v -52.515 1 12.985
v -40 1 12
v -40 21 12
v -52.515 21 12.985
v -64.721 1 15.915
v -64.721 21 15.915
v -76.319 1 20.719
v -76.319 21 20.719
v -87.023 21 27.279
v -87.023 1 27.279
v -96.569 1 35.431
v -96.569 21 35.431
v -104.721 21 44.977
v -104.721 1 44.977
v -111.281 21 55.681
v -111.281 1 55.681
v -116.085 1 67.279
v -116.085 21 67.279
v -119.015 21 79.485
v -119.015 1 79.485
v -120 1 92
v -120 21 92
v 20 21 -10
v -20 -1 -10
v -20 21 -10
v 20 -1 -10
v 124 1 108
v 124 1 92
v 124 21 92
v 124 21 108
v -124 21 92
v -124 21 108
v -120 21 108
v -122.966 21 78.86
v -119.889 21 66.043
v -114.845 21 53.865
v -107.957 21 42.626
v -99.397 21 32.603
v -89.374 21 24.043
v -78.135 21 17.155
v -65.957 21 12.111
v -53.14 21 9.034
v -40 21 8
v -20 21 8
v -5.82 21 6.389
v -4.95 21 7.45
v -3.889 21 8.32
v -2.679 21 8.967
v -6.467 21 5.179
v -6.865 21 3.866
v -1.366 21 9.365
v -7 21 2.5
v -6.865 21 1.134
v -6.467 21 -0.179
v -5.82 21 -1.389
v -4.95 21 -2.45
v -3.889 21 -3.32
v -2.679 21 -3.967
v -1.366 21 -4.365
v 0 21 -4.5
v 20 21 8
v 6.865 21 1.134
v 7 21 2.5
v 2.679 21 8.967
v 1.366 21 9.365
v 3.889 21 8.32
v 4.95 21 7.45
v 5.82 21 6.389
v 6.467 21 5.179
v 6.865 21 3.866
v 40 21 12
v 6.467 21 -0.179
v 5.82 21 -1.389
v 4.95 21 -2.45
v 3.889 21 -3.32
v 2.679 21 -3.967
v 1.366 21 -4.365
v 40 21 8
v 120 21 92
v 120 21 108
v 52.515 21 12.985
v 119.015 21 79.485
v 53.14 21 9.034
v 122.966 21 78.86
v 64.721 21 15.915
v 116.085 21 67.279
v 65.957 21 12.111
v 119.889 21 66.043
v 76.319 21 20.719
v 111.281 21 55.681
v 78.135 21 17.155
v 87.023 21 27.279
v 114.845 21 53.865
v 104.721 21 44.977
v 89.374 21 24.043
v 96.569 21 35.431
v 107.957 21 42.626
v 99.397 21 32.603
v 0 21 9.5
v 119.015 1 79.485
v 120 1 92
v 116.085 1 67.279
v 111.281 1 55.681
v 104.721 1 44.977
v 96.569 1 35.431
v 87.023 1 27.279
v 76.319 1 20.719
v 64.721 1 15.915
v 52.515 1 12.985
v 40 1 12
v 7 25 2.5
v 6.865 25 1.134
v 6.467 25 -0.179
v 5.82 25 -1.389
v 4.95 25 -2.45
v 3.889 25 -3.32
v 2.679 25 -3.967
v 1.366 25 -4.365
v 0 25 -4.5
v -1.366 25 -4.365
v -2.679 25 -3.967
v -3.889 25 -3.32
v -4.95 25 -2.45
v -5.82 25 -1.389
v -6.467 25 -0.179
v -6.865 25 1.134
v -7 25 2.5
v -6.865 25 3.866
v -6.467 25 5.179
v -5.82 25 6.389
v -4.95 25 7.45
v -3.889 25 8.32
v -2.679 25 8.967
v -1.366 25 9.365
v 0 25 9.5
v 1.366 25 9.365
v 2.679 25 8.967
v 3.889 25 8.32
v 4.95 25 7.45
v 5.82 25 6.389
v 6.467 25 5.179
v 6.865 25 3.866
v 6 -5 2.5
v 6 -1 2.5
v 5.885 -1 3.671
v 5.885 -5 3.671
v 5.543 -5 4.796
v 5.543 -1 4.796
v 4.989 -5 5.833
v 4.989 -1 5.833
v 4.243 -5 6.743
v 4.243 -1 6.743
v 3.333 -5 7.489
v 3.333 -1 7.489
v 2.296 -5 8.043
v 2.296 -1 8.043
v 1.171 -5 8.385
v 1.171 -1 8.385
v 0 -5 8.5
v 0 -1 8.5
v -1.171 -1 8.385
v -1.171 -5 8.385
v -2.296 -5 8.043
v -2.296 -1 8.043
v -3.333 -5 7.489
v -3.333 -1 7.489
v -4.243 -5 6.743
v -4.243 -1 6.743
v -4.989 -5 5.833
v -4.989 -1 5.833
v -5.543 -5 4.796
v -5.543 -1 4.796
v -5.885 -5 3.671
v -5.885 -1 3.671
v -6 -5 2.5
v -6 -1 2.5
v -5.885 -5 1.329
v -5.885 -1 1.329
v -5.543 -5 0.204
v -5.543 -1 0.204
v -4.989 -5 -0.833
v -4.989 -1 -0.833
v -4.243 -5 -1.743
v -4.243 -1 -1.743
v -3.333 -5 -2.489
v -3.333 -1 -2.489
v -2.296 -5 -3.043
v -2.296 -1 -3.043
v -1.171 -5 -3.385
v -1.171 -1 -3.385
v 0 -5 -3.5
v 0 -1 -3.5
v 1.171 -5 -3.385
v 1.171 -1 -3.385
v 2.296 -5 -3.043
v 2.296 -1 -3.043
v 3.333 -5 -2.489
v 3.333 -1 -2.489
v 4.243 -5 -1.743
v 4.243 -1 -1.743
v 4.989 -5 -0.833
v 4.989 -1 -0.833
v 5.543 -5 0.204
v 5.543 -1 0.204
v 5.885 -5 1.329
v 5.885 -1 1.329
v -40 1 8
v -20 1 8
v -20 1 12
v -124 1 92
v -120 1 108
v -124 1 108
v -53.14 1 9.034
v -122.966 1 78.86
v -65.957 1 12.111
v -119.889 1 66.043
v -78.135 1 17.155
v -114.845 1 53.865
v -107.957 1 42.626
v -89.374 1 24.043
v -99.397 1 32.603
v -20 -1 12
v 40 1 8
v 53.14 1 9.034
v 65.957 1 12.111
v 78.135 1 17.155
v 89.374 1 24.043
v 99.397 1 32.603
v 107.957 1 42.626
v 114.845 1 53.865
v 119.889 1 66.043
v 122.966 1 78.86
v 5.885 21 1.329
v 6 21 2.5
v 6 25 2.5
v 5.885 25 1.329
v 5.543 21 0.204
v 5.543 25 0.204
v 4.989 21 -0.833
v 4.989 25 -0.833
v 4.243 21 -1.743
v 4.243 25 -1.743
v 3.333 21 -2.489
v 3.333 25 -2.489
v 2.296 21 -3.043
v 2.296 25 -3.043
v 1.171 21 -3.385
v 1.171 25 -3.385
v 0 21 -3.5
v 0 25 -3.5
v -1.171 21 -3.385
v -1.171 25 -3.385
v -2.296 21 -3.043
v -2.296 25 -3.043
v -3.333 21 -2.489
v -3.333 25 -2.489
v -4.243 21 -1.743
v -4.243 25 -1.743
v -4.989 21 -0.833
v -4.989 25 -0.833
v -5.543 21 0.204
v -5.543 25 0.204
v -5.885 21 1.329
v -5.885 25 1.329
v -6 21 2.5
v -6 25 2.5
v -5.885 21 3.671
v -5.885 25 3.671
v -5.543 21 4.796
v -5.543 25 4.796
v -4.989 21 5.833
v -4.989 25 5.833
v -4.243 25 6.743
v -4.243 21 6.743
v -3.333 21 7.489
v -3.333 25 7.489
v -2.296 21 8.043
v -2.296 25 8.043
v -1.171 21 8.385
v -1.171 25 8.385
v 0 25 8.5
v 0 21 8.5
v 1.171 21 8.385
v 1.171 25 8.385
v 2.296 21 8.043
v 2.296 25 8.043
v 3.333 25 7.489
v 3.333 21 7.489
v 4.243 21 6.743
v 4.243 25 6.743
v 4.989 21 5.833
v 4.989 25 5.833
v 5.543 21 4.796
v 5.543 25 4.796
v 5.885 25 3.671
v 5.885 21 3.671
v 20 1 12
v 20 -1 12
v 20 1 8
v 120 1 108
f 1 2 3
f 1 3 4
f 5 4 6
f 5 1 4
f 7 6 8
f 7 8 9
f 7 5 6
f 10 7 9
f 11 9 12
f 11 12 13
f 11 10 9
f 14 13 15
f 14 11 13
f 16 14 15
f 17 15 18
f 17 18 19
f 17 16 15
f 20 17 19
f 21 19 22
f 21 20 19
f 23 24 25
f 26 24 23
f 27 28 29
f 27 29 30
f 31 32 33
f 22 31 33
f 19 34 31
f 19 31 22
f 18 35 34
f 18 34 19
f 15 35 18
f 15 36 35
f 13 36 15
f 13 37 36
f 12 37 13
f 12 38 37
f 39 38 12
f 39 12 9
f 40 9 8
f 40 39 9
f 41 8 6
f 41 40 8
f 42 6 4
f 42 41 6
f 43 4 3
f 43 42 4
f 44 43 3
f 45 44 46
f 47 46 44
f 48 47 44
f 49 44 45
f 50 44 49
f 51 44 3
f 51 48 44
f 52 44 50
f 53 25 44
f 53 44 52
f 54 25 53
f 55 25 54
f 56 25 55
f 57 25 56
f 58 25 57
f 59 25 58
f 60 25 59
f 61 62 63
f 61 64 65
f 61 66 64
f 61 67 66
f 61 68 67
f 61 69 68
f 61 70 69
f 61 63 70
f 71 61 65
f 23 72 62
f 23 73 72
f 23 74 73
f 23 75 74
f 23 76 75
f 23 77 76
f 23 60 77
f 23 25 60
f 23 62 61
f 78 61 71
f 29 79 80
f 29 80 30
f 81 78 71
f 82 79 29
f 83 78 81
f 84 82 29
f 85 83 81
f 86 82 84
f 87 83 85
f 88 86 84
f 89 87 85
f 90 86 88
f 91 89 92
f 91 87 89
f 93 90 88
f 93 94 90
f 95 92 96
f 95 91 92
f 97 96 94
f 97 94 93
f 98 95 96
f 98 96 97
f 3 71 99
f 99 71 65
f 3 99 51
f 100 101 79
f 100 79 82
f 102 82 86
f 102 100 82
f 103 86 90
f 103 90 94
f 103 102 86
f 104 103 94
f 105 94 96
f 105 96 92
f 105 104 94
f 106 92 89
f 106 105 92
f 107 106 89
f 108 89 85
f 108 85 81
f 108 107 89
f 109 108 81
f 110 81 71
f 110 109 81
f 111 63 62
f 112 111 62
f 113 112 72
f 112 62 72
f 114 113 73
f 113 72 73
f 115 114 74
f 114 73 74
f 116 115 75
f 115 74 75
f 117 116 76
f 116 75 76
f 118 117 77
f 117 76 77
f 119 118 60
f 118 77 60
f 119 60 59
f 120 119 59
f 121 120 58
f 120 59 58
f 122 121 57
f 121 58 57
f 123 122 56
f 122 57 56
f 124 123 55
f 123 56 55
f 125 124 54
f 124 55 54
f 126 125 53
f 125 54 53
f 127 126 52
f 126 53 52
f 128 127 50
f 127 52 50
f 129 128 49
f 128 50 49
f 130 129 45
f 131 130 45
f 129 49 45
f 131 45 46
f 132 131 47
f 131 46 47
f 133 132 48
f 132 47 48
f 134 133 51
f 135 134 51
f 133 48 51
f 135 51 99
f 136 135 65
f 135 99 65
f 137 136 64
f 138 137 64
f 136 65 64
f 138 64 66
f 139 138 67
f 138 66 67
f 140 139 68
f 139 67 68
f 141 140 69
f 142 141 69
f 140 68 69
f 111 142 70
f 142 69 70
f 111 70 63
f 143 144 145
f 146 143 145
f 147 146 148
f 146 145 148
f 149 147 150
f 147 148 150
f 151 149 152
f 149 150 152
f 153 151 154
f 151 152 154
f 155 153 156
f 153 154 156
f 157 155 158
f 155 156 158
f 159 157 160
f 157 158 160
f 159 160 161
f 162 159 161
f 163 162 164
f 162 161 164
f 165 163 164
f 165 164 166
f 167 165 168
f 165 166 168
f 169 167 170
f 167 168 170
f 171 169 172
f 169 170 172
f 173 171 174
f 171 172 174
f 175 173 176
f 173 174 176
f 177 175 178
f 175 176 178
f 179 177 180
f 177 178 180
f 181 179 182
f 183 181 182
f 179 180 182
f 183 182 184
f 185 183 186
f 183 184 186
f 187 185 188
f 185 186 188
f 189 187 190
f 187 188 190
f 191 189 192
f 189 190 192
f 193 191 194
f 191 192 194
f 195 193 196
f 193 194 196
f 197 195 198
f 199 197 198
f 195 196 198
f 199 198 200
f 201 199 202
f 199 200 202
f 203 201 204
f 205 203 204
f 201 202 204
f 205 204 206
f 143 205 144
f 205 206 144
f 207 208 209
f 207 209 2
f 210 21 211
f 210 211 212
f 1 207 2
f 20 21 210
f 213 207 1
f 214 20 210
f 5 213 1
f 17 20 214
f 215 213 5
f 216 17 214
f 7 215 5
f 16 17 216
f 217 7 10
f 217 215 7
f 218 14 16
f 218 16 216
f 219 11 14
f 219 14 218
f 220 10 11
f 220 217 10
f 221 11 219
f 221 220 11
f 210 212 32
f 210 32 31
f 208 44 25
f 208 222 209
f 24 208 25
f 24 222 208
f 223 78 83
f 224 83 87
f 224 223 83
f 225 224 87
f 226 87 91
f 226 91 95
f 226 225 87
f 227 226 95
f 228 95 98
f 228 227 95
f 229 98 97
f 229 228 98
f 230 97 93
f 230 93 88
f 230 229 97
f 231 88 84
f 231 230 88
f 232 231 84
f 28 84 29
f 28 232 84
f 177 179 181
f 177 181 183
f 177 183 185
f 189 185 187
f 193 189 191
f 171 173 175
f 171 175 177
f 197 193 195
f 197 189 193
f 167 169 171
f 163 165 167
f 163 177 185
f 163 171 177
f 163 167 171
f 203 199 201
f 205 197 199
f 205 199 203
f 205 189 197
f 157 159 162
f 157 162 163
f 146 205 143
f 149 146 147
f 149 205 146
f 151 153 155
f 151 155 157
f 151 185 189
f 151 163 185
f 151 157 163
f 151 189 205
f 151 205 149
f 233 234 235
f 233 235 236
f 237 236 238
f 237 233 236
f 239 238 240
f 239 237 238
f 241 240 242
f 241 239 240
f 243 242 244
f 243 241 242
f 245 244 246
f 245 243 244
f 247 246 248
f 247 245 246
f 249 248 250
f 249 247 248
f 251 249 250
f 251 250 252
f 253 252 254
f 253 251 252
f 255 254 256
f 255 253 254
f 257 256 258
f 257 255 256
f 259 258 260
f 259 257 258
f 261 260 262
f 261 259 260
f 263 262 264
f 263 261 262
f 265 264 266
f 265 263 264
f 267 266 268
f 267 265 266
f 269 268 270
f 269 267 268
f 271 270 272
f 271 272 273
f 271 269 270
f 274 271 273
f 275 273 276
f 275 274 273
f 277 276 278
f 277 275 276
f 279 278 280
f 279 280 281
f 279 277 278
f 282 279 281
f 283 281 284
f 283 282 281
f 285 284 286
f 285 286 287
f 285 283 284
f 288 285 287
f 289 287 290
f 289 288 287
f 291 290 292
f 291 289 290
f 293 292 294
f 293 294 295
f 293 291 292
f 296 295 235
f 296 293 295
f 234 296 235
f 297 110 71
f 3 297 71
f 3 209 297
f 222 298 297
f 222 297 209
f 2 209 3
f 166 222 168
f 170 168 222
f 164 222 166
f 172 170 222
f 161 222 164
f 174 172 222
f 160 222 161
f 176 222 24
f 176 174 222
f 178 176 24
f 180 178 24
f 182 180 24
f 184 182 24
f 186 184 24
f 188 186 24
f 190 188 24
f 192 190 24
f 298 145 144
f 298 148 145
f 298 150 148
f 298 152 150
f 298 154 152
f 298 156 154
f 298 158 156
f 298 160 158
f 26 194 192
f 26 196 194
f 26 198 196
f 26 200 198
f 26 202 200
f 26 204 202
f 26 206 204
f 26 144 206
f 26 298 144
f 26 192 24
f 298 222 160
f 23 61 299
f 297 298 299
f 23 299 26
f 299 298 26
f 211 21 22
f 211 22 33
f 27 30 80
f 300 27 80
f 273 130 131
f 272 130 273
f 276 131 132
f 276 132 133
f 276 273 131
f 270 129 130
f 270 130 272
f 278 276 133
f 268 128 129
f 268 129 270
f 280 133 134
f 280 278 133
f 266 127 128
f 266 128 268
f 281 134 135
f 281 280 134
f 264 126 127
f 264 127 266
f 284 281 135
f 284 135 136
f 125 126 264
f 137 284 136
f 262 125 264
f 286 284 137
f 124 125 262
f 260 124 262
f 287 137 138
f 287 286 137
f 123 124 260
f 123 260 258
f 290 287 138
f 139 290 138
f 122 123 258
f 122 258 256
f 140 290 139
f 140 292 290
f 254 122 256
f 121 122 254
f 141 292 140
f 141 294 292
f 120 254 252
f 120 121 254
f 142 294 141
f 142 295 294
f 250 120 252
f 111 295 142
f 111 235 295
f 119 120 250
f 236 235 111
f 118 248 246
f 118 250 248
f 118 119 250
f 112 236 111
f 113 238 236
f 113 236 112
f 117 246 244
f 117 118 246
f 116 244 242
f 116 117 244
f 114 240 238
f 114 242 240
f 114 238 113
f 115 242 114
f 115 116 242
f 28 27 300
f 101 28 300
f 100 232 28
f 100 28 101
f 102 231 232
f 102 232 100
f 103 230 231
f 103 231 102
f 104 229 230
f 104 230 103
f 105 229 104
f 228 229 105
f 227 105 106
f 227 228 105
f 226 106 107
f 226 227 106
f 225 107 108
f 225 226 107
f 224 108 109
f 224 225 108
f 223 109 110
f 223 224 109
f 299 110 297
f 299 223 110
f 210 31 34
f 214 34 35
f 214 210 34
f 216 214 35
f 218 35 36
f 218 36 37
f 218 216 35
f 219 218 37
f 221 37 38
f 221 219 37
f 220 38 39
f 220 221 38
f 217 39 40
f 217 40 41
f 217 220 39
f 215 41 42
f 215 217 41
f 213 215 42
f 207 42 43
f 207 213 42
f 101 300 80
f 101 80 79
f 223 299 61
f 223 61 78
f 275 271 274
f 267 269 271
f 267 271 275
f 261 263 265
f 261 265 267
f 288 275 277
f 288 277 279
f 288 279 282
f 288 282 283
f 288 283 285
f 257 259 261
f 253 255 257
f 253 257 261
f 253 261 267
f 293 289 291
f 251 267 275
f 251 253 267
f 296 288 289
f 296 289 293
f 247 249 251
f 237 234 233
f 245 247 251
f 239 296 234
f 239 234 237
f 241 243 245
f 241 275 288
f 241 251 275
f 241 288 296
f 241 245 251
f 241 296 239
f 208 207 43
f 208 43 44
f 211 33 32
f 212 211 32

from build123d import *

# Parameters (mm, degrees)
EXTRUDE_1_DEPTH = 20
EXTRUDE_4_DEPTH = 20
SKETCH_10_W     = 40
SKETCH_10_H     = 18
EXTRUDE_5_DEPTH = 20
SKETCH_11_R     = 7
SKETCH_11_R_2   = 6
EXTRUDE_6_DEPTH = 4
SKETCH_12_R     = 6
EXTRUDE_7_DEPTH = 4


with BuildPart() as part:
    # 草图2 → 凸台-拉伸1 (new body, symmetric)
    with BuildSketch(Plane(origin=(0, 0, 0), x_dir=(0, 0, -1), z_dir=(1, 0, 0))):
        Polygon((-10, 1), (10, 1), (10, -1), (-10, -1), (-12, -1), (-12, 1), align=None)
    extrude(amount=EXTRUDE_1_DEPTH, both=True)

    # 草图9 → 凸台-拉伸4 (add)
    with BuildSketch(Plane(origin=(0, 1, 0), x_dir=(1, 0, 0), z_dir=(0, 1, 0))):
        with BuildLine():
            Line((-40, -8), (40, -8))
            ThreePointArc((40, -8), (99.39696962, -32.60303038), (124, -92))
            Line((124, -92), (124, -108))
            Line((124, -108), (120, -108))
            Line((120, -108), (120, -92))
            ThreePointArc((120, -92), (96.568542495, -35.431457505), (40, -12))
            Line((40, -12), (-40, -12))
            ThreePointArc((-40, -12), (-96.568542495, -35.431457505), (-120, -92))
            Line((-120, -92), (-120, -108))
            Line((-120, -108), (-124, -108))
            Line((-124, -108), (-124, -92))
            ThreePointArc((-124, -92), (-99.39696962, -32.60303038), (-40, -8))
        make_face()
    extrude(amount=EXTRUDE_4_DEPTH)

    # 草图10 → 凸台-拉伸5 (add)
    with BuildSketch(Plane(origin=(0, 1, 0), x_dir=(1, 0, 0), z_dir=(0, 1, 0))):
        with Locations((0, 1)):
            Rectangle(SKETCH_10_W, SKETCH_10_H)
    extrude(amount=EXTRUDE_5_DEPTH)

    # 草图11 → 凸台-拉伸6 (add)
    with BuildSketch(Plane(origin=(0, 21, 0), x_dir=(1, 0, 0), z_dir=(0, 1, 0))):
        with Locations((0, -2.5)):
            Circle(SKETCH_11_R)
        with Locations((0, -2.5)):
            Circle(SKETCH_11_R_2, mode=Mode.SUBTRACT)
    extrude(amount=EXTRUDE_6_DEPTH)

    # 草图12 → 凸台-拉伸7 (add)
    with BuildSketch(Plane.XZ.offset(1)):
        with Locations((0, 2.5)):
            Circle(SKETCH_12_R)
    extrude(amount=EXTRUDE_7_DEPTH)


solid = part.part
